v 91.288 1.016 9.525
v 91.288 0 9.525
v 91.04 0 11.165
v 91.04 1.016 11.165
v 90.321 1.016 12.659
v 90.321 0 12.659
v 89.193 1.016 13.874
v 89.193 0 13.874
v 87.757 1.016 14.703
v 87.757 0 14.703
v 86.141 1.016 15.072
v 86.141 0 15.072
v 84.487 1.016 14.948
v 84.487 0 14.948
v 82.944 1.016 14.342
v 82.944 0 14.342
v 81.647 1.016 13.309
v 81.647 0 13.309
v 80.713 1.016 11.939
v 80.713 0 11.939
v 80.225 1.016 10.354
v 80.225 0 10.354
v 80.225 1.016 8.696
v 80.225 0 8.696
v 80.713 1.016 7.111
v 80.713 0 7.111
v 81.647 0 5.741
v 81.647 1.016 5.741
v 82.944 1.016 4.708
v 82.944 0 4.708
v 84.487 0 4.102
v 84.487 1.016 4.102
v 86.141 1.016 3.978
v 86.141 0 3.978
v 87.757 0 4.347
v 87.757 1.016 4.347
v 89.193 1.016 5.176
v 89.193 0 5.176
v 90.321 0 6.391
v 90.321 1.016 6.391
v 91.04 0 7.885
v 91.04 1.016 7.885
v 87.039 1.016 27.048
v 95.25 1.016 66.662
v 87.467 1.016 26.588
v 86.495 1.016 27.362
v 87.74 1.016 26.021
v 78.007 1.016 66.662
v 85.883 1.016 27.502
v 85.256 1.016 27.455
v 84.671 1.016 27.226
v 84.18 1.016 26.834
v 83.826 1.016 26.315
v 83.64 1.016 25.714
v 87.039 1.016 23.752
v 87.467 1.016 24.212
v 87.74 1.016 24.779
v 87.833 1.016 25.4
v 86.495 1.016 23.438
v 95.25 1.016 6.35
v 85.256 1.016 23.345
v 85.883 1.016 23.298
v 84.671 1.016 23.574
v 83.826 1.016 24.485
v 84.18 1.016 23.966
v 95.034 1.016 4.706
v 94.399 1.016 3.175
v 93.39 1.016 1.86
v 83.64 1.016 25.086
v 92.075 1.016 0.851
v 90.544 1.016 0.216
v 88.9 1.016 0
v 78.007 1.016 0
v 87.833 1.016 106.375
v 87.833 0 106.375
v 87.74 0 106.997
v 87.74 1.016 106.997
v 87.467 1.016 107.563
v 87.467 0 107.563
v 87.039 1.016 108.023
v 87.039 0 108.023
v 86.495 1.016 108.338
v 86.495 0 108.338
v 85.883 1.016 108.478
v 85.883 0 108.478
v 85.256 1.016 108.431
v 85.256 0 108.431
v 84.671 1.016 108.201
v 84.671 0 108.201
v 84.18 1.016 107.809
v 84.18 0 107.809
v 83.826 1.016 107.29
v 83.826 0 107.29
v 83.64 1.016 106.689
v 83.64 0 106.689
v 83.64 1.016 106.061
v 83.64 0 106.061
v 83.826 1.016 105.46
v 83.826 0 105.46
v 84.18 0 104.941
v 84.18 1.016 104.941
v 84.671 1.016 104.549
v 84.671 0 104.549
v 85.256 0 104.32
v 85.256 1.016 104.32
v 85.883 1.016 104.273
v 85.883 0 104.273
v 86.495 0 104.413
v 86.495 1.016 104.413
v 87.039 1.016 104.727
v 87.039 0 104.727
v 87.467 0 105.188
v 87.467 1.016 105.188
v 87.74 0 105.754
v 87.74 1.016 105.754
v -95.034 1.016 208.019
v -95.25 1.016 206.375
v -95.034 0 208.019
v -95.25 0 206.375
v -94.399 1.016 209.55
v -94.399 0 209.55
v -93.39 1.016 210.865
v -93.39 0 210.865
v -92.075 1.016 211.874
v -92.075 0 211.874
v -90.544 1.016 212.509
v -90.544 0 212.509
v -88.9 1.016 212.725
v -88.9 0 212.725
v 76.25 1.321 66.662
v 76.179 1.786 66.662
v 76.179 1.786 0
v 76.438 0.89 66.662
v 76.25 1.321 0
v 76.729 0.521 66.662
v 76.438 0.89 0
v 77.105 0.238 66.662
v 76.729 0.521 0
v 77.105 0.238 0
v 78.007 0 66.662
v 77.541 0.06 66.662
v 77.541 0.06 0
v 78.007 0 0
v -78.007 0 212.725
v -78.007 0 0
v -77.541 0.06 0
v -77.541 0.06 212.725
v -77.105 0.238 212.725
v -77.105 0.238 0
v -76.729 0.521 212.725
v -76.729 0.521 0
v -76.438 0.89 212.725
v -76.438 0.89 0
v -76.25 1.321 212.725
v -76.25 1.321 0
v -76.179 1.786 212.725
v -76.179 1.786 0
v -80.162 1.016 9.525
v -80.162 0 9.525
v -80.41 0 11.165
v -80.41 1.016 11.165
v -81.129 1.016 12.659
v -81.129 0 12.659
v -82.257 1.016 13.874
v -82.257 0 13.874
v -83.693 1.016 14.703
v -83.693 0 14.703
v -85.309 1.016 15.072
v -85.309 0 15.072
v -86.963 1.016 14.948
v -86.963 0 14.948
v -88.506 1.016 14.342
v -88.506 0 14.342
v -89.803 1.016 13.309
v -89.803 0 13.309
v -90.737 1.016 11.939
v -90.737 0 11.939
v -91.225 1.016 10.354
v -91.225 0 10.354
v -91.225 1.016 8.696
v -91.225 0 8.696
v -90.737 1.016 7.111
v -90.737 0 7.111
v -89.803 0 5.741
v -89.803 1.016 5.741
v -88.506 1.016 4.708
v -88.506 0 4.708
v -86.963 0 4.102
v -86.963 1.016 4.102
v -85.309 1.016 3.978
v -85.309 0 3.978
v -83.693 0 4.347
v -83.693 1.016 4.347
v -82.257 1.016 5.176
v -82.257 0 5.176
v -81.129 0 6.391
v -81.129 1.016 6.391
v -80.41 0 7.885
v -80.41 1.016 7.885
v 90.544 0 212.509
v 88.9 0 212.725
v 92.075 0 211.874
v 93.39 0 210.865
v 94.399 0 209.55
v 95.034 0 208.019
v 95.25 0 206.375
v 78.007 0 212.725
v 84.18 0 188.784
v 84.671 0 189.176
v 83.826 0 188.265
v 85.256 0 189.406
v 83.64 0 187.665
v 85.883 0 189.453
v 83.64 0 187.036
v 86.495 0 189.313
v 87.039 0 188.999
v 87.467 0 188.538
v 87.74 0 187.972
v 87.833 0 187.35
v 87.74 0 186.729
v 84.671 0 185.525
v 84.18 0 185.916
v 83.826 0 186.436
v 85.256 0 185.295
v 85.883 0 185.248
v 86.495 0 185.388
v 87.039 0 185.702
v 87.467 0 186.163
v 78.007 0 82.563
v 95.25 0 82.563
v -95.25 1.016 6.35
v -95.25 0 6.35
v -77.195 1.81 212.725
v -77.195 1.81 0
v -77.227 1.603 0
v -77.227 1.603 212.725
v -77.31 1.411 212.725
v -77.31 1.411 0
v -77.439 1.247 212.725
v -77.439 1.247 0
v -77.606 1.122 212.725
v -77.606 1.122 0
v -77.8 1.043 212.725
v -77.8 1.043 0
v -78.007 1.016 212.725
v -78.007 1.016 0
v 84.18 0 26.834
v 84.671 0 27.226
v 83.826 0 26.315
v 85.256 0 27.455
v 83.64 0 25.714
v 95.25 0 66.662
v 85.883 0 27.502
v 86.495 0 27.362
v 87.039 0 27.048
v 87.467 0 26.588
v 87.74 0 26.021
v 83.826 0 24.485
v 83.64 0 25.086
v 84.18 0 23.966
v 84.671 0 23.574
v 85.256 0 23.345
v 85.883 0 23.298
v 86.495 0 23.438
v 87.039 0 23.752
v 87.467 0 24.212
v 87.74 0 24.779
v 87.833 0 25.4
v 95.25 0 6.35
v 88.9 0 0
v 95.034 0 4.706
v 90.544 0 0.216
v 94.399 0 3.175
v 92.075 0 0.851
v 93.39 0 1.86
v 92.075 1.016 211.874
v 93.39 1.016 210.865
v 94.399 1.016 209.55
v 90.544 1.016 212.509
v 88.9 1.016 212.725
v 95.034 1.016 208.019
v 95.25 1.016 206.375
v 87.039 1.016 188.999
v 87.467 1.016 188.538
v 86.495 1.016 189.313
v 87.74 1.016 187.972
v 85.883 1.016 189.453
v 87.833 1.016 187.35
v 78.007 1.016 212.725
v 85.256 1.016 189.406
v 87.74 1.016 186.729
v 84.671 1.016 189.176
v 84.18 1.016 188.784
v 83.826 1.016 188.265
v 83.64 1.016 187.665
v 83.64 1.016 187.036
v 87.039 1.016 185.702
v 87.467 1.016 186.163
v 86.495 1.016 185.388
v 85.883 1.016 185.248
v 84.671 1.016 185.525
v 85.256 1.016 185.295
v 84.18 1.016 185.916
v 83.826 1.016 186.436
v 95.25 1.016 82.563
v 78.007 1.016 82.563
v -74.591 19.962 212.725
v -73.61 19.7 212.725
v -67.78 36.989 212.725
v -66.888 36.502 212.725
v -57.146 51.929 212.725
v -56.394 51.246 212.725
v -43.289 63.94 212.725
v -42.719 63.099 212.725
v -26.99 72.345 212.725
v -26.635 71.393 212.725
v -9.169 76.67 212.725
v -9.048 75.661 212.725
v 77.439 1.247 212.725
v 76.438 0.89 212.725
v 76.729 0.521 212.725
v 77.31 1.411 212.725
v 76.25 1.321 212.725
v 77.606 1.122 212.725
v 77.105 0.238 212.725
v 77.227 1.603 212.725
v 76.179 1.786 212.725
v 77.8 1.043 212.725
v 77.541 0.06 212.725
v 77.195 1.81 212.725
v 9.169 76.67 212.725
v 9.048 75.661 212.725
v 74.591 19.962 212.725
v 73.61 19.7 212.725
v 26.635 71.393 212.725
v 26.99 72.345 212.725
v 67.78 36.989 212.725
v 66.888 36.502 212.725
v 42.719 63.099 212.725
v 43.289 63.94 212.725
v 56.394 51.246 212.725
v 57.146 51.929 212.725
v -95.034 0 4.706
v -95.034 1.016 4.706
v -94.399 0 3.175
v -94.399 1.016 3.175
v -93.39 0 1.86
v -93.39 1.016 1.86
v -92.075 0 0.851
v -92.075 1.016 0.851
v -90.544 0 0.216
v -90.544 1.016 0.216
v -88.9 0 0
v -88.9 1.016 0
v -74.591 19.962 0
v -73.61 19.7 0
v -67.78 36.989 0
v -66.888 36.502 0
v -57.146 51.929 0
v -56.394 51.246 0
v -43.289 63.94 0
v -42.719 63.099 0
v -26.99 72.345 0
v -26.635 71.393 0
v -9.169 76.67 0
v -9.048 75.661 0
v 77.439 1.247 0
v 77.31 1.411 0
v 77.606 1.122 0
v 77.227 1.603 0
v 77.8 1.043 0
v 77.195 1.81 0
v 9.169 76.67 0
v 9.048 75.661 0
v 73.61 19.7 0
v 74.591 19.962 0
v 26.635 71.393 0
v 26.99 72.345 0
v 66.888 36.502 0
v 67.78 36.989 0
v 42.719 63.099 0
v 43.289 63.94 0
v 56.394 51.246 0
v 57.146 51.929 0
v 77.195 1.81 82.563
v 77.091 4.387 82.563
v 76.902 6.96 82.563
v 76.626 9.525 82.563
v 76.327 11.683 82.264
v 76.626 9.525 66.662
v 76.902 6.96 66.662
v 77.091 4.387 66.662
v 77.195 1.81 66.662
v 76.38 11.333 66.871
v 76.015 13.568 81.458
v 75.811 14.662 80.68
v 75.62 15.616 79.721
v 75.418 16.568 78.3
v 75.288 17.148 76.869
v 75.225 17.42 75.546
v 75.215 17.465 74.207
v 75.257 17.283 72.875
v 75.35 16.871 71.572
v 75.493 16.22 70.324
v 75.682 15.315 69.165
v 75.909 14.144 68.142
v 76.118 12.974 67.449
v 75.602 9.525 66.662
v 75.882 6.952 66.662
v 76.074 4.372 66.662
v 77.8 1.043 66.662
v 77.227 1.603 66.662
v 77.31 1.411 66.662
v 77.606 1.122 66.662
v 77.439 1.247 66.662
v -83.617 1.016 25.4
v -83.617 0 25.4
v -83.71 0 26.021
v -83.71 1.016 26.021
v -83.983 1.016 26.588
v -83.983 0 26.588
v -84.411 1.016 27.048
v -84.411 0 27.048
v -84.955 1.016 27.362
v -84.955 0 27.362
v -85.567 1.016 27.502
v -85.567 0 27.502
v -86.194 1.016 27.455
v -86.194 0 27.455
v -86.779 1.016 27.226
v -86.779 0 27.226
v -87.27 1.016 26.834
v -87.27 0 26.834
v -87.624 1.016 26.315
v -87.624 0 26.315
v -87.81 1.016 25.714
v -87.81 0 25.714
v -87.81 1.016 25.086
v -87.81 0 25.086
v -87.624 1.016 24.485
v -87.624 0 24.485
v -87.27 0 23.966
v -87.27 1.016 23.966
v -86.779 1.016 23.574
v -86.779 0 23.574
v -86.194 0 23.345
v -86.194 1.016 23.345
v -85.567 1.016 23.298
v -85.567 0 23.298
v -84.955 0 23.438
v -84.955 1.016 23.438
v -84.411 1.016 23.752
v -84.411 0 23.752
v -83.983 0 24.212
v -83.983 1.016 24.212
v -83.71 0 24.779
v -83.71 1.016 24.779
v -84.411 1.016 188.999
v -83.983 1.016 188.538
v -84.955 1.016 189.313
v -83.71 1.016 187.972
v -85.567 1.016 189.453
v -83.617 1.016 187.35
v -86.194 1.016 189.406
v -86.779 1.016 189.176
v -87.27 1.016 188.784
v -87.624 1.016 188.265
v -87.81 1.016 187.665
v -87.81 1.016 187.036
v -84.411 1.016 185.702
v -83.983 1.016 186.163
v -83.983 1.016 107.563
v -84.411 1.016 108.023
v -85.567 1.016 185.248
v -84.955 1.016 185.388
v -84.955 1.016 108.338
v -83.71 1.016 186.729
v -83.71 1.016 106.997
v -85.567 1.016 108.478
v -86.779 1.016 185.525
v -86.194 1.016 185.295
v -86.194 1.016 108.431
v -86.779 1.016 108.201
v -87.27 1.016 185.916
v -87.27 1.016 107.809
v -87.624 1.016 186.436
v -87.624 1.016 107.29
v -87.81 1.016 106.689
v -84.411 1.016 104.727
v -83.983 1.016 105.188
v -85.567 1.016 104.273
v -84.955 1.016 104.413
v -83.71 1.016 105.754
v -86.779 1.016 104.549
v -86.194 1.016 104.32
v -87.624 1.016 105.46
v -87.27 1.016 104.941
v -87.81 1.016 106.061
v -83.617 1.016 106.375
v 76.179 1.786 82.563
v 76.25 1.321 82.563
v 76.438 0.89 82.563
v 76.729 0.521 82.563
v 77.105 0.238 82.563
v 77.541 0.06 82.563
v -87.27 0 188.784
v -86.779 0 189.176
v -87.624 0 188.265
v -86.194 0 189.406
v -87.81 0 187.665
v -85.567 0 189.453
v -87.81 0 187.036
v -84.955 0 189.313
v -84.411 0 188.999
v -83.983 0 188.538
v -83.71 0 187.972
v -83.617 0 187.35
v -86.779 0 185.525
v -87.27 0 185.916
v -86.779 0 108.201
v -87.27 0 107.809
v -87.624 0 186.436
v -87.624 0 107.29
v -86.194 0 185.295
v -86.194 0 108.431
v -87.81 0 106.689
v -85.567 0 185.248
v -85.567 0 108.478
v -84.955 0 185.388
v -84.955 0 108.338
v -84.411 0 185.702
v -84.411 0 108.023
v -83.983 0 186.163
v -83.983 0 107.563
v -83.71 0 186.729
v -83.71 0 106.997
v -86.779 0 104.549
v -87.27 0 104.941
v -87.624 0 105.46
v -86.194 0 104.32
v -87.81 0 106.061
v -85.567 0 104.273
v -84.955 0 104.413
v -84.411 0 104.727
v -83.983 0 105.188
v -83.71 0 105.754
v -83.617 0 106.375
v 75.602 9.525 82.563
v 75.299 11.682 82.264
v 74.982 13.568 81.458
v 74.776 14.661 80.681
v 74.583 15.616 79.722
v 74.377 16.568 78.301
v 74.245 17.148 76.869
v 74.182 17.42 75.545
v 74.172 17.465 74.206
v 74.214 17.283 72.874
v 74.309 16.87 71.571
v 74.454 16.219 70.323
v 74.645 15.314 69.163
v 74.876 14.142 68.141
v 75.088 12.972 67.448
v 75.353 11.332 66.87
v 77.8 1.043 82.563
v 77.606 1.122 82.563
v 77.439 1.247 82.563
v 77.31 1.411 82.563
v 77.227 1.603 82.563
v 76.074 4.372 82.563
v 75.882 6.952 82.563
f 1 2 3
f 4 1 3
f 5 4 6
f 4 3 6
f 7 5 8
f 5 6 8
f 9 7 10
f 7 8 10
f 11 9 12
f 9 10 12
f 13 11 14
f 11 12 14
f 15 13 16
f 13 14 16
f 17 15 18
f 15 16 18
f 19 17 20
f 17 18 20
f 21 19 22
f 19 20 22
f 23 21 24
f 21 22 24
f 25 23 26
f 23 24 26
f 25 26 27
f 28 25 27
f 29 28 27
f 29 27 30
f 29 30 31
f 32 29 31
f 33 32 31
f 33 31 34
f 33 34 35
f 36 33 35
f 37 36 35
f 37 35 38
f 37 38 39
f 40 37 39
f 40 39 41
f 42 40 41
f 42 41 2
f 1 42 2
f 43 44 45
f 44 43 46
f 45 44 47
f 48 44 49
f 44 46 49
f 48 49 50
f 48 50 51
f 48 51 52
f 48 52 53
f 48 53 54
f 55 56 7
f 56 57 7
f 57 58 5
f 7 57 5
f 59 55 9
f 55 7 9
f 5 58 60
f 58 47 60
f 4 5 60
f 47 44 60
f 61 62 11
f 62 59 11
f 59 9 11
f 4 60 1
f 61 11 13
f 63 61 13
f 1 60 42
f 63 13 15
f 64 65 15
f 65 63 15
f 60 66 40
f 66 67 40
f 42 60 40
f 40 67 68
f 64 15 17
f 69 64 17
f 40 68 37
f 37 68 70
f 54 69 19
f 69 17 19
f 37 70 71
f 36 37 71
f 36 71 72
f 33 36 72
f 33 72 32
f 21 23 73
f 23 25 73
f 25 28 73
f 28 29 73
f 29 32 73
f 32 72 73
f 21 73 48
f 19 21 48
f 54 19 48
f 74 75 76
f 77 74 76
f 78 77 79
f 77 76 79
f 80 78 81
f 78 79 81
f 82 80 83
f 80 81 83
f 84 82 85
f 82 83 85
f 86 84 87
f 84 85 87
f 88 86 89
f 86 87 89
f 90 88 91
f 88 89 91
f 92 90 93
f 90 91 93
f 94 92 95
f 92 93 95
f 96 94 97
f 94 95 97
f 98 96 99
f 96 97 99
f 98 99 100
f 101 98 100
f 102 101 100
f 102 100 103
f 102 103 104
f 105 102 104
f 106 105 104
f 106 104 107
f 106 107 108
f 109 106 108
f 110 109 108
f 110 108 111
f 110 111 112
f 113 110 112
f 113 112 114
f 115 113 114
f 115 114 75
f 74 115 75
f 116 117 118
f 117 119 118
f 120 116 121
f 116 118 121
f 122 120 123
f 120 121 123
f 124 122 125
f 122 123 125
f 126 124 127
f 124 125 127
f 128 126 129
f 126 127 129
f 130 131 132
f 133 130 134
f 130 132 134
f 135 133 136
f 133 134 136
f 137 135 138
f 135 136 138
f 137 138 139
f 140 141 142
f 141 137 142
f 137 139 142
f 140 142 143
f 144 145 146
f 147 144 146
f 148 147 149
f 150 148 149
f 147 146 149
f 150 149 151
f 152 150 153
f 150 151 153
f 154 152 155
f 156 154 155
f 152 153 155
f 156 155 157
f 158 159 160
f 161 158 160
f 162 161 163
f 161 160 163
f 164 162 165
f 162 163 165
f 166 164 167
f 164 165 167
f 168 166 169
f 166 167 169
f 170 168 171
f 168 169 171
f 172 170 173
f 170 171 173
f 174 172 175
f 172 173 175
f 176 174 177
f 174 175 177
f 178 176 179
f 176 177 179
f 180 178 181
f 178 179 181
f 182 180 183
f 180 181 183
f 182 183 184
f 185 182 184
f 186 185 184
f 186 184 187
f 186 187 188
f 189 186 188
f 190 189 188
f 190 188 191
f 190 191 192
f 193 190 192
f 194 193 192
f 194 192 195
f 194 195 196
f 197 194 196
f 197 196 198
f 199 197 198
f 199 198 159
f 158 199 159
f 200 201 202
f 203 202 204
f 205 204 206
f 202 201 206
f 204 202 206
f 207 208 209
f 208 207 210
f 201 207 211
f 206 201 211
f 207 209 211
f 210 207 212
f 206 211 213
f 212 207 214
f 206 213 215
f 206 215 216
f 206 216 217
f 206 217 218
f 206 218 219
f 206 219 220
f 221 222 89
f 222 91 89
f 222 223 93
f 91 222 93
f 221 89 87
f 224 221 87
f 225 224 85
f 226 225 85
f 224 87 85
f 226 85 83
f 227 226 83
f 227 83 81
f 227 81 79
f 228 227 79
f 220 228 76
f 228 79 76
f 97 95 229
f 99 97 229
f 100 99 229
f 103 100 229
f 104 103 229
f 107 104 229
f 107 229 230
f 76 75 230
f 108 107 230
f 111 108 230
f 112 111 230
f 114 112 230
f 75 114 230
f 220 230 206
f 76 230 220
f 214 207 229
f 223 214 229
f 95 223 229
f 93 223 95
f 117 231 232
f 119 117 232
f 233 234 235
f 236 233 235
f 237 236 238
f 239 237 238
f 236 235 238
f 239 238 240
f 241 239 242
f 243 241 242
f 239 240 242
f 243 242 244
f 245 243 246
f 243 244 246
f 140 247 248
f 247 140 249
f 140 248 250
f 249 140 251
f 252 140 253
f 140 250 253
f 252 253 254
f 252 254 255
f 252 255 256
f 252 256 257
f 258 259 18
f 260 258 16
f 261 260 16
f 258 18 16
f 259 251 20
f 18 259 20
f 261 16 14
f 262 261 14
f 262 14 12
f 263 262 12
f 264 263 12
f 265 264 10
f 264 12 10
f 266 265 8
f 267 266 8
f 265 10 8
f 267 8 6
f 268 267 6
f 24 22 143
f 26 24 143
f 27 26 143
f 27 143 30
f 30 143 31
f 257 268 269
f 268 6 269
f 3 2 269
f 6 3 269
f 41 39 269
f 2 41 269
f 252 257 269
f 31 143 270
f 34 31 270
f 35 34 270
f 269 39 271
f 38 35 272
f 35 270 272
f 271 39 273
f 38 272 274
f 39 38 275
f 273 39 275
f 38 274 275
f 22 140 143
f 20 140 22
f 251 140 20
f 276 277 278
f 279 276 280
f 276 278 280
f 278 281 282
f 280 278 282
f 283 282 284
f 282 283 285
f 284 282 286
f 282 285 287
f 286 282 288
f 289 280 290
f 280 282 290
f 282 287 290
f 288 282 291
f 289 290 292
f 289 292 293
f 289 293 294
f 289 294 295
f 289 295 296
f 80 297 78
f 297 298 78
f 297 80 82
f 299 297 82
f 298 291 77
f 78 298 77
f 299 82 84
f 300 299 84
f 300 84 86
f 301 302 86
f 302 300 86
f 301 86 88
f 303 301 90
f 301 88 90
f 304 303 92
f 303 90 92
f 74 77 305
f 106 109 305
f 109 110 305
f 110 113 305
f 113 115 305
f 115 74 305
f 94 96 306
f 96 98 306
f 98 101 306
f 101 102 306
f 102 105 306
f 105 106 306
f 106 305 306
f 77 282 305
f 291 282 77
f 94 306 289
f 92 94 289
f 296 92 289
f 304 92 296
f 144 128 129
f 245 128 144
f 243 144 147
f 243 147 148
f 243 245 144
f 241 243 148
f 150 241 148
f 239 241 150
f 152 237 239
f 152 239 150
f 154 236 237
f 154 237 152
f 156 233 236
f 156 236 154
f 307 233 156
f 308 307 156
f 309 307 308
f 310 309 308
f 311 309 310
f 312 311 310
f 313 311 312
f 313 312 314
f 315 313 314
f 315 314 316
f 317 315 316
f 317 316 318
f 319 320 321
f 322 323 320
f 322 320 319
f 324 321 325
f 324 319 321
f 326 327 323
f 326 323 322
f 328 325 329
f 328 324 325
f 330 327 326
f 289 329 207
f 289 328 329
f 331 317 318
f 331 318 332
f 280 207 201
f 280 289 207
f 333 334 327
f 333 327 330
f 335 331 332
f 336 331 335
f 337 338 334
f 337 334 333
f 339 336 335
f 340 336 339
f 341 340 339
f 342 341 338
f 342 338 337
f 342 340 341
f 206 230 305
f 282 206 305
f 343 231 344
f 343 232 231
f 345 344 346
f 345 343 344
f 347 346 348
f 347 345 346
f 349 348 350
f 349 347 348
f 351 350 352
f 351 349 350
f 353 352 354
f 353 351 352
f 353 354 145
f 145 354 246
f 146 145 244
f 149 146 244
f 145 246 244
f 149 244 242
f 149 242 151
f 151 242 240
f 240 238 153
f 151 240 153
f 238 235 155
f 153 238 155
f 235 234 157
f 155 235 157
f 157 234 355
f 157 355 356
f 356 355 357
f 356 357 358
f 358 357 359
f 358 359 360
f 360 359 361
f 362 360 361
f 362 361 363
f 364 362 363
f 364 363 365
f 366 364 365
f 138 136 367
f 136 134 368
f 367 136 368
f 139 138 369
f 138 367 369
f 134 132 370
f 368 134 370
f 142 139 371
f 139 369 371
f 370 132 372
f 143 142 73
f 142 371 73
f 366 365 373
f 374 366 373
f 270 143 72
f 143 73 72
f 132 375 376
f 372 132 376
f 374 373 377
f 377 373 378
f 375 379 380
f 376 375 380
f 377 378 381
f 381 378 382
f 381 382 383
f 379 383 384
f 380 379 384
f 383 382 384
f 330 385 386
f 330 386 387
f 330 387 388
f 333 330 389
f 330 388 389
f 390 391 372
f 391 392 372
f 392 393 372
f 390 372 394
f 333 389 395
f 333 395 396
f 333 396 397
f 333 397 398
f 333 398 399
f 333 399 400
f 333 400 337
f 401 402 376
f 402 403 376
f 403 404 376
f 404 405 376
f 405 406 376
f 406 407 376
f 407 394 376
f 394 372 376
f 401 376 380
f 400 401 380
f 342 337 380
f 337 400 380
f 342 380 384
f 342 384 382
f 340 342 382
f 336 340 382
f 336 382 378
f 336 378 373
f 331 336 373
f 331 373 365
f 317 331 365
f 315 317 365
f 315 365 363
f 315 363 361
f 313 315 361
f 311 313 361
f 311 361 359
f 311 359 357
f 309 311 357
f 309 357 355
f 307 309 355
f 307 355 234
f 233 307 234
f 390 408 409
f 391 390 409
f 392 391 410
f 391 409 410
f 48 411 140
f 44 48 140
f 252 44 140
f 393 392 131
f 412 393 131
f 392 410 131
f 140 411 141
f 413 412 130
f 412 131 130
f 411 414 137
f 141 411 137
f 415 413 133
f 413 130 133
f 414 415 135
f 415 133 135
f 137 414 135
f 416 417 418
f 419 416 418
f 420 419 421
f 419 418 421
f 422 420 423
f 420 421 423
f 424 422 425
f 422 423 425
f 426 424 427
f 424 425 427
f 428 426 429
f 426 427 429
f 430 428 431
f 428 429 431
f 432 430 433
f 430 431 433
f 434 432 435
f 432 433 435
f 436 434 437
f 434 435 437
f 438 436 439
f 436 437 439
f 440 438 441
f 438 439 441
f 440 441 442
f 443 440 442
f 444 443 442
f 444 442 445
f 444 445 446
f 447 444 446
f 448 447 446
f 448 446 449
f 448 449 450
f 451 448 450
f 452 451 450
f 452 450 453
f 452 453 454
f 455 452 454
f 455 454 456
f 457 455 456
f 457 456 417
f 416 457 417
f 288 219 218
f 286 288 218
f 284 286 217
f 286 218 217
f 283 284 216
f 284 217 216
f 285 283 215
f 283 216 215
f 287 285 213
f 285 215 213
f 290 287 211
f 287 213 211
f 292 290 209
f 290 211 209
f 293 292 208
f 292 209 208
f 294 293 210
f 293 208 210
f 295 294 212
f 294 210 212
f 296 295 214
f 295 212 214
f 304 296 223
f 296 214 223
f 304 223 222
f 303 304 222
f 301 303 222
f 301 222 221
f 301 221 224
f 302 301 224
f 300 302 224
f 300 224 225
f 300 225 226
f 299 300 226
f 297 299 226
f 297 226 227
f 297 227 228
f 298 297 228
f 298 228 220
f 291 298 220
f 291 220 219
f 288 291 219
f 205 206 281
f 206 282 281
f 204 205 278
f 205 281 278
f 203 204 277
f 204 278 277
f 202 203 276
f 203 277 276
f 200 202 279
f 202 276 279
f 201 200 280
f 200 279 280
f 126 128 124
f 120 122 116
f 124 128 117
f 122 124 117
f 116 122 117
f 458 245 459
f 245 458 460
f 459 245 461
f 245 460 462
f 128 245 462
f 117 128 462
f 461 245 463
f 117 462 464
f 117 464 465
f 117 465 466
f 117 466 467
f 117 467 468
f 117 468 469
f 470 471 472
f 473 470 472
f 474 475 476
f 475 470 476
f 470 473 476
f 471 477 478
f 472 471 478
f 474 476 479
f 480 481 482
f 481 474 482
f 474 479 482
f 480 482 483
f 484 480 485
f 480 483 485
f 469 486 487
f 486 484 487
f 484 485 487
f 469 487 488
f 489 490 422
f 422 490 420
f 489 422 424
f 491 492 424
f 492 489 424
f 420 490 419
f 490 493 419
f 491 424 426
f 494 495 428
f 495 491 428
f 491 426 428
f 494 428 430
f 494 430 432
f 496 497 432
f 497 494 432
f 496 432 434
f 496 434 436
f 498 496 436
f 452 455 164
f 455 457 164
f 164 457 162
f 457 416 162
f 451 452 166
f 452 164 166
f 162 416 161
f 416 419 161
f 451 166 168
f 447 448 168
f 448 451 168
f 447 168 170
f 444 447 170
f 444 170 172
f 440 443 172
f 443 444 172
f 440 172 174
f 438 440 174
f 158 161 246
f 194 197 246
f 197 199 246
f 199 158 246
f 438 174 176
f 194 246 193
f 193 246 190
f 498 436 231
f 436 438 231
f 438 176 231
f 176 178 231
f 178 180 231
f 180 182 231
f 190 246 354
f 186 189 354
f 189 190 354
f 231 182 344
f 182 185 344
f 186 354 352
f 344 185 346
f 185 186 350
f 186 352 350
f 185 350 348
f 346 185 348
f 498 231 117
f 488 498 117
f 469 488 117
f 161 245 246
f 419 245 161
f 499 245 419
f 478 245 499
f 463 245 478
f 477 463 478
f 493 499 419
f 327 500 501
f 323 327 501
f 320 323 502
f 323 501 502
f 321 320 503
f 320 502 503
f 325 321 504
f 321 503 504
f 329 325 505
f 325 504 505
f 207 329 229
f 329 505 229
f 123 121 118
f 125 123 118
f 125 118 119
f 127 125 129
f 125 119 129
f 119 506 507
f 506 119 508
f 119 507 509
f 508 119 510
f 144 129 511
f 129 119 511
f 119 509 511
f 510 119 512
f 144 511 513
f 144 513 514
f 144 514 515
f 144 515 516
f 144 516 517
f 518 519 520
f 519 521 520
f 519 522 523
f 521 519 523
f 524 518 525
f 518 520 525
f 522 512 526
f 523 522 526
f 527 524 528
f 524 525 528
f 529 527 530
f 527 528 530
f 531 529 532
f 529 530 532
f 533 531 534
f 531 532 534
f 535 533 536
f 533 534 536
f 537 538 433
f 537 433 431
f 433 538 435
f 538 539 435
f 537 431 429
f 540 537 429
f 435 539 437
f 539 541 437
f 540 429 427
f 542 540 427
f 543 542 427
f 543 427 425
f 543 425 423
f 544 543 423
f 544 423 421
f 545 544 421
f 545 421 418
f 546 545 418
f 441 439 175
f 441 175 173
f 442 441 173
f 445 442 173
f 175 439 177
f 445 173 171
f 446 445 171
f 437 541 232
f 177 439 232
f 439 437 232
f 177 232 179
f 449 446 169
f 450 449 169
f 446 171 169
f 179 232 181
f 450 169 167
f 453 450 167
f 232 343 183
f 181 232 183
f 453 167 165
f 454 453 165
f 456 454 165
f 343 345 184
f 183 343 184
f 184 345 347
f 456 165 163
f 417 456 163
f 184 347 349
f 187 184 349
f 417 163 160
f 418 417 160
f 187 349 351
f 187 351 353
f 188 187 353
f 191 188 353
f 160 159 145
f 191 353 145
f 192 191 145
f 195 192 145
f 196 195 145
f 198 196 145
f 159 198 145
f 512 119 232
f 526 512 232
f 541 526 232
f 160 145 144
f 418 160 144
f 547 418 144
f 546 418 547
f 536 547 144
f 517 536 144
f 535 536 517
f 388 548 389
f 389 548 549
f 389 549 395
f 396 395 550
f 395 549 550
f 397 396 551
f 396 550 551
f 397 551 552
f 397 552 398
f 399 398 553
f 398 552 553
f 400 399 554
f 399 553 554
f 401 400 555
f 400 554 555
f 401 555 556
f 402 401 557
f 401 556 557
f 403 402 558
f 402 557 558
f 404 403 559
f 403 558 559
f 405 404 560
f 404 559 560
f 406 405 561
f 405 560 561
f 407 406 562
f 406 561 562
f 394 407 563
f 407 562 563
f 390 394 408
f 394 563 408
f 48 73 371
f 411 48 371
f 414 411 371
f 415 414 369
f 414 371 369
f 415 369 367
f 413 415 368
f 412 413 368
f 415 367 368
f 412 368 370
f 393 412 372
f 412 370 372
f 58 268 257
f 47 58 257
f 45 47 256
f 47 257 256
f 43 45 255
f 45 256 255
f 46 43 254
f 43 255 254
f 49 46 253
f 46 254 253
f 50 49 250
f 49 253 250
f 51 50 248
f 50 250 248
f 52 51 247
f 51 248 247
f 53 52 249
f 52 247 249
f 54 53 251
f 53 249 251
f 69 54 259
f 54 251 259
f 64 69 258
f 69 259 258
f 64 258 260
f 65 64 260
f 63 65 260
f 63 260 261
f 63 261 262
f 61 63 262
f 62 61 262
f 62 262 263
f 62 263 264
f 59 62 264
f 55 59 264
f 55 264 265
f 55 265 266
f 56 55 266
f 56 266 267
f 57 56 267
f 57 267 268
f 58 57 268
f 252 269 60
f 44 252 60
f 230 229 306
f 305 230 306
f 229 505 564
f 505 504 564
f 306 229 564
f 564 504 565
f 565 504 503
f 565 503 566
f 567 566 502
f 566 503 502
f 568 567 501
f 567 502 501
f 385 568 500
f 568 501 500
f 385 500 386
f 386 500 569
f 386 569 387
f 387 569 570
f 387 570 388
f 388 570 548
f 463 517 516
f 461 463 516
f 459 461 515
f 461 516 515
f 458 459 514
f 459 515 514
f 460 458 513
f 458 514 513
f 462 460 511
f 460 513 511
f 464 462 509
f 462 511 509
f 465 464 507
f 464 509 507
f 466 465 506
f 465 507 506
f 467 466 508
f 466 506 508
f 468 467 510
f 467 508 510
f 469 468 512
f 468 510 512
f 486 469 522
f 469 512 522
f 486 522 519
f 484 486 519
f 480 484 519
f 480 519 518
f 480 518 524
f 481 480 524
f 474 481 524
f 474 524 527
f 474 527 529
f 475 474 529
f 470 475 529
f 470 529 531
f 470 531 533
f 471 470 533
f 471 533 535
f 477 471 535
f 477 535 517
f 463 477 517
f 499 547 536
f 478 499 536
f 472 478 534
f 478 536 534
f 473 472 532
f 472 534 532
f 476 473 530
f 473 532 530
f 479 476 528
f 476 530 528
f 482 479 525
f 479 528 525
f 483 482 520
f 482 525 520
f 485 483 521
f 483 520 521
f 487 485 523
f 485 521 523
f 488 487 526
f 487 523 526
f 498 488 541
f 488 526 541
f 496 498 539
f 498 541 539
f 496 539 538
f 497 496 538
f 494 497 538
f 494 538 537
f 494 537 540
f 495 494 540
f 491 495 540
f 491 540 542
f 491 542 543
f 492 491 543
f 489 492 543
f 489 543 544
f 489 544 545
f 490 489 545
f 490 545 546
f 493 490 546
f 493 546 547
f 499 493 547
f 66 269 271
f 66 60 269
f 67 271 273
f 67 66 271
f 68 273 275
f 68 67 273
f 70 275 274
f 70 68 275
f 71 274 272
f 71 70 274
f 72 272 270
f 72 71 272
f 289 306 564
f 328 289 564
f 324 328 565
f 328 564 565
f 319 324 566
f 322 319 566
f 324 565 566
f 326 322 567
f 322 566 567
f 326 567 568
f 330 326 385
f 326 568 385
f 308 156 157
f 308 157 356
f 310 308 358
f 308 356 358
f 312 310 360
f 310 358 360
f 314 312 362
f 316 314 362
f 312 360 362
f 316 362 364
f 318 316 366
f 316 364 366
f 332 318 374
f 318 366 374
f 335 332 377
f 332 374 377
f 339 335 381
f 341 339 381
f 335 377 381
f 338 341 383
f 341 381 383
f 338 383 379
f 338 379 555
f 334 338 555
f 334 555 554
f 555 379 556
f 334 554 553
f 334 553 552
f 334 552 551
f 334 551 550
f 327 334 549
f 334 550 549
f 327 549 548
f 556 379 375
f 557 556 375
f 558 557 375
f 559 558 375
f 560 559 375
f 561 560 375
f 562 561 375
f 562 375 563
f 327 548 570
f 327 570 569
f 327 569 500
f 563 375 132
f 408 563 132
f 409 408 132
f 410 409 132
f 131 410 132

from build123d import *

# Parameters (mm, degrees)
BASE_FLANGE1_DEPTH = 212.725
FILLET1_R          = 6.35
SKETCH3_R          = 5.5626
SKETCH3_R_2        = 2.1082
CUT_EXTRUDE1_DEPTH = 7.62
CUT_EXTRUDE2_DEPTH = 246.533701925


# Read off the part's stored shape, not the designer's step: Base-Flange1
with BuildPart() as part:
    # Base-Flange1 outline → Base-Flange1 (new body)
    with BuildSketch(Plane.XY):
        with BuildLine():
            Line((-78.007365806, 1.016), (-95.25, 1.016))
            Line((-95.25, 1.016), (-95.25, 0))
            Line((-95.25, 0), (-78.007365806, 0))
            ThreePointArc((-78.007365806, 0), (-76.729452957, 0.520576705), (-76.17906817, 1.7859375))
            ThreePointArc((-76.17906817, 1.7859375), (0, 76.2), (76.17906817, 1.7859375))
            ThreePointArc((76.17906817, 1.7859375), (76.729452957, 0.520576705), (78.007365806, 0))
            Line((78.007365806, 0), (95.25, 0))
            Line((95.25, 0), (95.25, 1.016))
            Line((95.25, 1.016), (78.007365806, 1.016))
            ThreePointArc((78.007365806, 1.016), (77.43940454, 1.247367424), (77.194789079, 1.80975))
            ThreePointArc((77.194789079, 1.80975), (0, 77.216), (-77.194789079, 1.80975))
            ThreePointArc((-77.194789079, 1.80975), (-77.43940454, 1.247367424), (-78.007365806, 1.016))
        make_face()
    extrude(amount=BASE_FLANGE1_DEPTH)

    # Fillet1
    fillet1_edges = [part.edges().sort_by_distance(p)[0] for p in [
        (95.25, 0.508, 0),
        (-95.25, 0.508, 0),
        (95.25, 0.508, 212.725),
        (-95.25, 0.508, 212.725),
    ]]
    fillet(fillet1_edges, radius=FILLET1_R)

    # Sketch3 → Cut-Extrude1 (cut)
    with BuildSketch(Plane.XZ):
        with Locations((-85.725, 9.525)):
            Circle(SKETCH3_R)
        with Locations((-85.725, 25.4)):
            Circle(SKETCH3_R_2)
        with Locations((-85.725, 106.3752)):
            Circle(SKETCH3_R_2)
        with Locations((-85.725, 187.3504)):
            Circle(SKETCH3_R_2)
        with Locations((85.725, 9.525)):
            Circle(SKETCH3_R)
        with Locations((85.725, 25.4)):
            Circle(SKETCH3_R_2)
        with Locations((85.725, 106.3752)):
            Circle(SKETCH3_R_2)
        with Locations((85.725, 187.3504)):
            Circle(SKETCH3_R_2)
    extrude(amount=-CUT_EXTRUDE1_DEPTH, mode=Mode.SUBTRACT)

    # Sketch4 → Cut-Extrude2 (cut, through all)
    with BuildSketch(Plane(origin=(0, 0, 0), x_dir=(0, 0, -1), z_dir=(1, 0, 0))):
        with BuildLine():
            Line((-82.5627, -6.3754), (-82.5627, 9.525))
            ThreePointArc((-82.5627, 9.525), (-74.6125, 17.4752), (-66.6623, 9.525))
            Line((-66.6623, 9.525), (-66.6623, -6.3754))
            Line((-66.6623, -6.3754), (-82.5627, -6.3754))
        make_face()
    extrude(amount=CUT_EXTRUDE2_DEPTH, mode=Mode.SUBTRACT)


solid = part.part
